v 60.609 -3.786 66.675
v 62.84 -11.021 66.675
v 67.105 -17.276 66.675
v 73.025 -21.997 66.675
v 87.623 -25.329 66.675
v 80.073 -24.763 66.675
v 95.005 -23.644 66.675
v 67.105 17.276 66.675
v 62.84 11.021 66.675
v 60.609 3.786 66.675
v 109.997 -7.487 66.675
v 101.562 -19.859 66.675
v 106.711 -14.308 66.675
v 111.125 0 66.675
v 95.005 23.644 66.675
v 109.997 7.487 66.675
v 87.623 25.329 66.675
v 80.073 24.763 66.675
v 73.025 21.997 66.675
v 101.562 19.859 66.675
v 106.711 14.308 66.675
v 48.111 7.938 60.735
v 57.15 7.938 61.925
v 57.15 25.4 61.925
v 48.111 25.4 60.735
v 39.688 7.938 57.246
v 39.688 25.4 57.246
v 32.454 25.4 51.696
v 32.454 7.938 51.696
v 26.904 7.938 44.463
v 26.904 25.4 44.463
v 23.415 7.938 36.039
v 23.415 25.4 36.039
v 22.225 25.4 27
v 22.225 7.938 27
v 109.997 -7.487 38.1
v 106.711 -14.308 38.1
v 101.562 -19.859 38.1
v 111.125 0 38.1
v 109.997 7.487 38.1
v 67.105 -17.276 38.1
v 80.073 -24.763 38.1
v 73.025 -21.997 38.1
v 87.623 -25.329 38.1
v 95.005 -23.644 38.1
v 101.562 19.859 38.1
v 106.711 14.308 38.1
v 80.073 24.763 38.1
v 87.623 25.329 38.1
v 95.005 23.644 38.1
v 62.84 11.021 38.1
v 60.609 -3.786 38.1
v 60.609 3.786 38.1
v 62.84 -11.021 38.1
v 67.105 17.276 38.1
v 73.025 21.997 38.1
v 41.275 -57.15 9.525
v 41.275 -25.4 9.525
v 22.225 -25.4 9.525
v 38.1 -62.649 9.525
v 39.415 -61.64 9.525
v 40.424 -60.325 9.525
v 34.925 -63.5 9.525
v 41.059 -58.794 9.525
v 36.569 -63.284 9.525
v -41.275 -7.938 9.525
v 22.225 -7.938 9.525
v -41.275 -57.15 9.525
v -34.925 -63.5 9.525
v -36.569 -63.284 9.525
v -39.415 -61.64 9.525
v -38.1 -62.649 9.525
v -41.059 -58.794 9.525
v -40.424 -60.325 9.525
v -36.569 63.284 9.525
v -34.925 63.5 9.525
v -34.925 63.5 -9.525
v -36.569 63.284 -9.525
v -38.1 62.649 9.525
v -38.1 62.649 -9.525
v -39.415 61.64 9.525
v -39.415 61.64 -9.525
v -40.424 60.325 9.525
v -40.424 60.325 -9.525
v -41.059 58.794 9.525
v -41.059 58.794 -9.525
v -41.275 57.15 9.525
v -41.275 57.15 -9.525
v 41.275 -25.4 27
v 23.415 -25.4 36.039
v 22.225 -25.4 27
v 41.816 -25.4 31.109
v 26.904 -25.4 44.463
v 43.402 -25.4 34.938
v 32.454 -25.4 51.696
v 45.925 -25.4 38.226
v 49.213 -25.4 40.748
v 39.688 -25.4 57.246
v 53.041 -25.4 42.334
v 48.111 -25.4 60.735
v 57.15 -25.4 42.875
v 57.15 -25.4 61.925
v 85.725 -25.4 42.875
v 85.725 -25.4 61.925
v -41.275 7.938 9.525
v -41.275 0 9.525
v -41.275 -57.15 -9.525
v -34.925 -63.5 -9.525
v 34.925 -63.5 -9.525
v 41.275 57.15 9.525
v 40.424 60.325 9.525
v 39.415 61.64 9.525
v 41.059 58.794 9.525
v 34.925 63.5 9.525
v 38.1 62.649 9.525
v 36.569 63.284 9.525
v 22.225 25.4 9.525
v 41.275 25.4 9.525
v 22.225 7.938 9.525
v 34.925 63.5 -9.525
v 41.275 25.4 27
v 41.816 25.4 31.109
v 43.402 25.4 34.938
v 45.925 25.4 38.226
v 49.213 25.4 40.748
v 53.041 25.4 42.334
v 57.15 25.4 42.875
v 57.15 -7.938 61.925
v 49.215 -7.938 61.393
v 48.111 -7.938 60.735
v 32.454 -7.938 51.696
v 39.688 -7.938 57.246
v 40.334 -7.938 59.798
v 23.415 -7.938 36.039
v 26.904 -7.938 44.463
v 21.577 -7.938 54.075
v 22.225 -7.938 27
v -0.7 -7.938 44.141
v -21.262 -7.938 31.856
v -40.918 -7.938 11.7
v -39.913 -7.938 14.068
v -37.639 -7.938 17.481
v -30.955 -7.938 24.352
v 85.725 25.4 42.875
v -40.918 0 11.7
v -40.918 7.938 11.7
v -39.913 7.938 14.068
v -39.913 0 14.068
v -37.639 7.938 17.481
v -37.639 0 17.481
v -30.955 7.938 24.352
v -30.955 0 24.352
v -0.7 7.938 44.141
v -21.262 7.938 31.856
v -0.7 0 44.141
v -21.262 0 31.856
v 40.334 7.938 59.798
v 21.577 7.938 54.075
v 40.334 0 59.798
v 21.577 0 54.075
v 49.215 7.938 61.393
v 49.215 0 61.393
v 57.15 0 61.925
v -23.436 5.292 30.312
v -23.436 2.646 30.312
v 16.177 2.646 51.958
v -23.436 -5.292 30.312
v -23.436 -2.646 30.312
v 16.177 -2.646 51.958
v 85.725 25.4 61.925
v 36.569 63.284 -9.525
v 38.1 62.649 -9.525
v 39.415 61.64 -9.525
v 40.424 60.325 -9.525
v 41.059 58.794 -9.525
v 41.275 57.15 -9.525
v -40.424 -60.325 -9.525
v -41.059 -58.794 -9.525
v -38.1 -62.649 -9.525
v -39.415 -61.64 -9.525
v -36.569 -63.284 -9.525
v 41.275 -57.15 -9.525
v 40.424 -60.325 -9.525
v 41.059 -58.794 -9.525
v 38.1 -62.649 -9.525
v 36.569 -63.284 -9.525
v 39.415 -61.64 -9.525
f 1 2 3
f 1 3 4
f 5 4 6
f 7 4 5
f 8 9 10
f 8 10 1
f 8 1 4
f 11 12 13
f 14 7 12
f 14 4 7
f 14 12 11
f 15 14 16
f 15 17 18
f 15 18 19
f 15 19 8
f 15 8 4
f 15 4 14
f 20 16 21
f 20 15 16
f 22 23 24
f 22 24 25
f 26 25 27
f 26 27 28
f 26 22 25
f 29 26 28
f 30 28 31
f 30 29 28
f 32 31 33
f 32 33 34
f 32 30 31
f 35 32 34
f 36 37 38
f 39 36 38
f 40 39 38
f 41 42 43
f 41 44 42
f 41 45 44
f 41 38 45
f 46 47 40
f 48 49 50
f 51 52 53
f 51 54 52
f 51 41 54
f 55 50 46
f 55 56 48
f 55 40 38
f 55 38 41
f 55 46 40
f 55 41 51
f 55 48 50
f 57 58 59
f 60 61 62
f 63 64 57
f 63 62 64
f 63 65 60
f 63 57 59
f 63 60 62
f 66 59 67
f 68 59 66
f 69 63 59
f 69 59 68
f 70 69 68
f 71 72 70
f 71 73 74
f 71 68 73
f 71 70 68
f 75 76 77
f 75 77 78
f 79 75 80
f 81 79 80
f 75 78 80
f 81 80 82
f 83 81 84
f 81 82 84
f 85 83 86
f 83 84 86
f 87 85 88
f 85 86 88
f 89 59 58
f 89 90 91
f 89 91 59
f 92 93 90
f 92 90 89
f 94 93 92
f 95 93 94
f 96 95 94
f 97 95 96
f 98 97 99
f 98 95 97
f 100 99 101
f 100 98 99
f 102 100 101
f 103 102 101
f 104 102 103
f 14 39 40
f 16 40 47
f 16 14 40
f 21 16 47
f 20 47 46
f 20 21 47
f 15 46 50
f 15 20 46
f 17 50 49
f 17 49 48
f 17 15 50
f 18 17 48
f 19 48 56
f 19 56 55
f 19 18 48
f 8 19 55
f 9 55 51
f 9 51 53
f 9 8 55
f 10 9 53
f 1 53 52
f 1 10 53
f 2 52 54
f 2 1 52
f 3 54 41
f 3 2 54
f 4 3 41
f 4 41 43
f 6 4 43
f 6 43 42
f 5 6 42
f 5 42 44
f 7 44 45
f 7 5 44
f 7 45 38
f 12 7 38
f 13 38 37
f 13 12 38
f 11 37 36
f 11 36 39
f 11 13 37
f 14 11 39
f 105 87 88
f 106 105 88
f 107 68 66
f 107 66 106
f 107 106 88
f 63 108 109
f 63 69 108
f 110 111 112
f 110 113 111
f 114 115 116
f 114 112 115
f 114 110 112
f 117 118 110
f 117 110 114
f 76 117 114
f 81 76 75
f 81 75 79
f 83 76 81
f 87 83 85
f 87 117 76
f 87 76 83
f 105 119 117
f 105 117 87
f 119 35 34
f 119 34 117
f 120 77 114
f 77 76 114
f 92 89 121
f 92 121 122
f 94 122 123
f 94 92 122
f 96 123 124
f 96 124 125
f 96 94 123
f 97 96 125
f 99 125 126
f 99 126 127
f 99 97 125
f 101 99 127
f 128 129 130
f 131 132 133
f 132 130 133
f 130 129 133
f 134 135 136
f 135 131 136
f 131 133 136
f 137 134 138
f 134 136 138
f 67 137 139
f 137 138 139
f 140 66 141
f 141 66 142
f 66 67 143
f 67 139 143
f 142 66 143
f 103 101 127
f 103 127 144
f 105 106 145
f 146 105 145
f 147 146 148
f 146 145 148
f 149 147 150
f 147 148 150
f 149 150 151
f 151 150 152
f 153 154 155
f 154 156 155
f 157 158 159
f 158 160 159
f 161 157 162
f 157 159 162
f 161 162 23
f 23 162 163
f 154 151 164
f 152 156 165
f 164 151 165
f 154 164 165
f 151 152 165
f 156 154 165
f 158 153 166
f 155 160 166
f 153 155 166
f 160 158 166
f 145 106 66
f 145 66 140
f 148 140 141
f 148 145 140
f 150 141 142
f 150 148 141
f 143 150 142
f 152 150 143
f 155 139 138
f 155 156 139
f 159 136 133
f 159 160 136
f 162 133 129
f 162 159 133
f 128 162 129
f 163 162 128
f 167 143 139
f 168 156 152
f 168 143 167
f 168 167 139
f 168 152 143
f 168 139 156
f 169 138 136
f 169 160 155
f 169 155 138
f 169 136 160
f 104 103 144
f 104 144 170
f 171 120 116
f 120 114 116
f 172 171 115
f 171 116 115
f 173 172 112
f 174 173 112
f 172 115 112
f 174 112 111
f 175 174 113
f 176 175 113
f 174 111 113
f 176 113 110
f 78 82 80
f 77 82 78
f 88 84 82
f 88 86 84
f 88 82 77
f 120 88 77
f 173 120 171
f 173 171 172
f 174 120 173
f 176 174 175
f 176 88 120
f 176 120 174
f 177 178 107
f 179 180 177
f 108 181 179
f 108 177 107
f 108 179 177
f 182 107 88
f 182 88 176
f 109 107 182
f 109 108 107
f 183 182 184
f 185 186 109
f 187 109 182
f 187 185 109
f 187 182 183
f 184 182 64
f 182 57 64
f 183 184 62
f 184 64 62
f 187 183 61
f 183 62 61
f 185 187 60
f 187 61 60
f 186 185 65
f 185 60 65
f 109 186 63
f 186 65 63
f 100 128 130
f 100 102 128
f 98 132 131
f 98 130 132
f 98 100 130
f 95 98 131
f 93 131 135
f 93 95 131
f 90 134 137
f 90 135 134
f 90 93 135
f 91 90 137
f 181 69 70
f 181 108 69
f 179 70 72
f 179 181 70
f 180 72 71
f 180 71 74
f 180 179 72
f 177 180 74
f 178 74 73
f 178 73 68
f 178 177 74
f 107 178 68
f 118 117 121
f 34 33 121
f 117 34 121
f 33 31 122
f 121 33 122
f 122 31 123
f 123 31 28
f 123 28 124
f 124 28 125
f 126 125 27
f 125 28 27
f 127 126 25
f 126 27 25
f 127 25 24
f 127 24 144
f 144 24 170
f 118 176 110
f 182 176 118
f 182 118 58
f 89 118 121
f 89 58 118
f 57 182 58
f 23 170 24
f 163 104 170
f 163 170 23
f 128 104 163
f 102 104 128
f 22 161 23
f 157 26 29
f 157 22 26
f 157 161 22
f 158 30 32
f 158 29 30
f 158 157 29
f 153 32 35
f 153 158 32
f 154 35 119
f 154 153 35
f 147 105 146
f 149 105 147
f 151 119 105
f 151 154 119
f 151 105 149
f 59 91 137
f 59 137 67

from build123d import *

# Parameters (mm, degrees)
F1_DEPTH = 63.5
F0_W     = 25.4
F0_H     = 19.05
F2_DEPTH = 25.4
F3_DEPTH = 7.9375
F5_R     = 6.35


with BuildPart() as f1:
    # F0 (on Front) → F1 (new body, symmetric)
    with BuildSketch(Plane.XZ):
        Polygon((-41.275, -9.525), (41.275, -9.525), (41.275, 9.525), (22.225, 9.525), (-41.275, 9.525), align=None)
    extrude(amount=F1_DEPTH, both=True)

    # F0 (on Front) → F2 (join, symmetric)
    with BuildSketch(Plane.XZ):
        with BuildLine():
            Line((22.225, 9.525), (41.275, 9.525))
            Line((41.275, 9.525), (41.275, 27.0002))
            ThreePointArc((41.275, 27.0002), (45.9246798487, 38.2255201513), (57.15, 42.8752))
            Line((57.15, 42.8752), (60.325, 42.8752))
            Line((60.325, 42.8752), (60.325, 61.9252))
            Line((60.325, 61.9252), (57.15, 61.9252))
            ThreePointArc((57.15, 61.9252), (32.4542956671, 51.6959043329), (22.225, 27.0002))
            Line((22.225, 27.0002), (22.225, 9.525))
        make_face()
        with Locations((73.025, 52.4002)):
            Rectangle(F0_W, F0_H)
    extrude(amount=F2_DEPTH, both=True)

    # F0 (on Front) → F3 (join, symmetric)
    with BuildSketch(Plane.XZ):
        with BuildLine():
            add(Edge.make_bspline(
                [(-41.275, 9.525), (-41.1268435419, 25.7026944309), (22.3007723689, 61.976660043), (57.15, 61.9252)],
                knots=[0, 0, 0, 0, 111.5045361635, 111.5045361635, 111.5045361635, 111.5045361635], degree=3))
            Line((-41.275, 9.525), (22.225, 9.525))
            Line((22.225, 9.525), (22.225, 27.0002))
            ThreePointArc((22.225, 27.0002), (32.4542956671, 51.6959043329), (57.15, 61.9252))
        make_face()
    extrude(amount=F3_DEPTH, both=True)

    # F5
    f5_edges = [f1.edges().sort_by_distance(p)[0] for p in [
        (41.275, -63.5, 0),
        (41.275, 63.5, 0),
        (-41.275, 63.5, 0),
        (-41.275, -63.5, 0),
    ]]
    fillet(f5_edges, radius=F5_R)


with BuildPart() as f4:
    # F0 (on Front) → F4 (revolve)
    with BuildSketch(Plane.XZ):
        Polygon((85.725, 66.675), (85.725, 61.9252), (85.725, 42.8752), (85.725, 38.1), (111.125, 38.1), (111.125, 66.675), align=None)
    revolve(axis=Axis((85.725, 0, 52.3875), (0, 0, 1)))


solid = Compound([f1.part, f4.part])
